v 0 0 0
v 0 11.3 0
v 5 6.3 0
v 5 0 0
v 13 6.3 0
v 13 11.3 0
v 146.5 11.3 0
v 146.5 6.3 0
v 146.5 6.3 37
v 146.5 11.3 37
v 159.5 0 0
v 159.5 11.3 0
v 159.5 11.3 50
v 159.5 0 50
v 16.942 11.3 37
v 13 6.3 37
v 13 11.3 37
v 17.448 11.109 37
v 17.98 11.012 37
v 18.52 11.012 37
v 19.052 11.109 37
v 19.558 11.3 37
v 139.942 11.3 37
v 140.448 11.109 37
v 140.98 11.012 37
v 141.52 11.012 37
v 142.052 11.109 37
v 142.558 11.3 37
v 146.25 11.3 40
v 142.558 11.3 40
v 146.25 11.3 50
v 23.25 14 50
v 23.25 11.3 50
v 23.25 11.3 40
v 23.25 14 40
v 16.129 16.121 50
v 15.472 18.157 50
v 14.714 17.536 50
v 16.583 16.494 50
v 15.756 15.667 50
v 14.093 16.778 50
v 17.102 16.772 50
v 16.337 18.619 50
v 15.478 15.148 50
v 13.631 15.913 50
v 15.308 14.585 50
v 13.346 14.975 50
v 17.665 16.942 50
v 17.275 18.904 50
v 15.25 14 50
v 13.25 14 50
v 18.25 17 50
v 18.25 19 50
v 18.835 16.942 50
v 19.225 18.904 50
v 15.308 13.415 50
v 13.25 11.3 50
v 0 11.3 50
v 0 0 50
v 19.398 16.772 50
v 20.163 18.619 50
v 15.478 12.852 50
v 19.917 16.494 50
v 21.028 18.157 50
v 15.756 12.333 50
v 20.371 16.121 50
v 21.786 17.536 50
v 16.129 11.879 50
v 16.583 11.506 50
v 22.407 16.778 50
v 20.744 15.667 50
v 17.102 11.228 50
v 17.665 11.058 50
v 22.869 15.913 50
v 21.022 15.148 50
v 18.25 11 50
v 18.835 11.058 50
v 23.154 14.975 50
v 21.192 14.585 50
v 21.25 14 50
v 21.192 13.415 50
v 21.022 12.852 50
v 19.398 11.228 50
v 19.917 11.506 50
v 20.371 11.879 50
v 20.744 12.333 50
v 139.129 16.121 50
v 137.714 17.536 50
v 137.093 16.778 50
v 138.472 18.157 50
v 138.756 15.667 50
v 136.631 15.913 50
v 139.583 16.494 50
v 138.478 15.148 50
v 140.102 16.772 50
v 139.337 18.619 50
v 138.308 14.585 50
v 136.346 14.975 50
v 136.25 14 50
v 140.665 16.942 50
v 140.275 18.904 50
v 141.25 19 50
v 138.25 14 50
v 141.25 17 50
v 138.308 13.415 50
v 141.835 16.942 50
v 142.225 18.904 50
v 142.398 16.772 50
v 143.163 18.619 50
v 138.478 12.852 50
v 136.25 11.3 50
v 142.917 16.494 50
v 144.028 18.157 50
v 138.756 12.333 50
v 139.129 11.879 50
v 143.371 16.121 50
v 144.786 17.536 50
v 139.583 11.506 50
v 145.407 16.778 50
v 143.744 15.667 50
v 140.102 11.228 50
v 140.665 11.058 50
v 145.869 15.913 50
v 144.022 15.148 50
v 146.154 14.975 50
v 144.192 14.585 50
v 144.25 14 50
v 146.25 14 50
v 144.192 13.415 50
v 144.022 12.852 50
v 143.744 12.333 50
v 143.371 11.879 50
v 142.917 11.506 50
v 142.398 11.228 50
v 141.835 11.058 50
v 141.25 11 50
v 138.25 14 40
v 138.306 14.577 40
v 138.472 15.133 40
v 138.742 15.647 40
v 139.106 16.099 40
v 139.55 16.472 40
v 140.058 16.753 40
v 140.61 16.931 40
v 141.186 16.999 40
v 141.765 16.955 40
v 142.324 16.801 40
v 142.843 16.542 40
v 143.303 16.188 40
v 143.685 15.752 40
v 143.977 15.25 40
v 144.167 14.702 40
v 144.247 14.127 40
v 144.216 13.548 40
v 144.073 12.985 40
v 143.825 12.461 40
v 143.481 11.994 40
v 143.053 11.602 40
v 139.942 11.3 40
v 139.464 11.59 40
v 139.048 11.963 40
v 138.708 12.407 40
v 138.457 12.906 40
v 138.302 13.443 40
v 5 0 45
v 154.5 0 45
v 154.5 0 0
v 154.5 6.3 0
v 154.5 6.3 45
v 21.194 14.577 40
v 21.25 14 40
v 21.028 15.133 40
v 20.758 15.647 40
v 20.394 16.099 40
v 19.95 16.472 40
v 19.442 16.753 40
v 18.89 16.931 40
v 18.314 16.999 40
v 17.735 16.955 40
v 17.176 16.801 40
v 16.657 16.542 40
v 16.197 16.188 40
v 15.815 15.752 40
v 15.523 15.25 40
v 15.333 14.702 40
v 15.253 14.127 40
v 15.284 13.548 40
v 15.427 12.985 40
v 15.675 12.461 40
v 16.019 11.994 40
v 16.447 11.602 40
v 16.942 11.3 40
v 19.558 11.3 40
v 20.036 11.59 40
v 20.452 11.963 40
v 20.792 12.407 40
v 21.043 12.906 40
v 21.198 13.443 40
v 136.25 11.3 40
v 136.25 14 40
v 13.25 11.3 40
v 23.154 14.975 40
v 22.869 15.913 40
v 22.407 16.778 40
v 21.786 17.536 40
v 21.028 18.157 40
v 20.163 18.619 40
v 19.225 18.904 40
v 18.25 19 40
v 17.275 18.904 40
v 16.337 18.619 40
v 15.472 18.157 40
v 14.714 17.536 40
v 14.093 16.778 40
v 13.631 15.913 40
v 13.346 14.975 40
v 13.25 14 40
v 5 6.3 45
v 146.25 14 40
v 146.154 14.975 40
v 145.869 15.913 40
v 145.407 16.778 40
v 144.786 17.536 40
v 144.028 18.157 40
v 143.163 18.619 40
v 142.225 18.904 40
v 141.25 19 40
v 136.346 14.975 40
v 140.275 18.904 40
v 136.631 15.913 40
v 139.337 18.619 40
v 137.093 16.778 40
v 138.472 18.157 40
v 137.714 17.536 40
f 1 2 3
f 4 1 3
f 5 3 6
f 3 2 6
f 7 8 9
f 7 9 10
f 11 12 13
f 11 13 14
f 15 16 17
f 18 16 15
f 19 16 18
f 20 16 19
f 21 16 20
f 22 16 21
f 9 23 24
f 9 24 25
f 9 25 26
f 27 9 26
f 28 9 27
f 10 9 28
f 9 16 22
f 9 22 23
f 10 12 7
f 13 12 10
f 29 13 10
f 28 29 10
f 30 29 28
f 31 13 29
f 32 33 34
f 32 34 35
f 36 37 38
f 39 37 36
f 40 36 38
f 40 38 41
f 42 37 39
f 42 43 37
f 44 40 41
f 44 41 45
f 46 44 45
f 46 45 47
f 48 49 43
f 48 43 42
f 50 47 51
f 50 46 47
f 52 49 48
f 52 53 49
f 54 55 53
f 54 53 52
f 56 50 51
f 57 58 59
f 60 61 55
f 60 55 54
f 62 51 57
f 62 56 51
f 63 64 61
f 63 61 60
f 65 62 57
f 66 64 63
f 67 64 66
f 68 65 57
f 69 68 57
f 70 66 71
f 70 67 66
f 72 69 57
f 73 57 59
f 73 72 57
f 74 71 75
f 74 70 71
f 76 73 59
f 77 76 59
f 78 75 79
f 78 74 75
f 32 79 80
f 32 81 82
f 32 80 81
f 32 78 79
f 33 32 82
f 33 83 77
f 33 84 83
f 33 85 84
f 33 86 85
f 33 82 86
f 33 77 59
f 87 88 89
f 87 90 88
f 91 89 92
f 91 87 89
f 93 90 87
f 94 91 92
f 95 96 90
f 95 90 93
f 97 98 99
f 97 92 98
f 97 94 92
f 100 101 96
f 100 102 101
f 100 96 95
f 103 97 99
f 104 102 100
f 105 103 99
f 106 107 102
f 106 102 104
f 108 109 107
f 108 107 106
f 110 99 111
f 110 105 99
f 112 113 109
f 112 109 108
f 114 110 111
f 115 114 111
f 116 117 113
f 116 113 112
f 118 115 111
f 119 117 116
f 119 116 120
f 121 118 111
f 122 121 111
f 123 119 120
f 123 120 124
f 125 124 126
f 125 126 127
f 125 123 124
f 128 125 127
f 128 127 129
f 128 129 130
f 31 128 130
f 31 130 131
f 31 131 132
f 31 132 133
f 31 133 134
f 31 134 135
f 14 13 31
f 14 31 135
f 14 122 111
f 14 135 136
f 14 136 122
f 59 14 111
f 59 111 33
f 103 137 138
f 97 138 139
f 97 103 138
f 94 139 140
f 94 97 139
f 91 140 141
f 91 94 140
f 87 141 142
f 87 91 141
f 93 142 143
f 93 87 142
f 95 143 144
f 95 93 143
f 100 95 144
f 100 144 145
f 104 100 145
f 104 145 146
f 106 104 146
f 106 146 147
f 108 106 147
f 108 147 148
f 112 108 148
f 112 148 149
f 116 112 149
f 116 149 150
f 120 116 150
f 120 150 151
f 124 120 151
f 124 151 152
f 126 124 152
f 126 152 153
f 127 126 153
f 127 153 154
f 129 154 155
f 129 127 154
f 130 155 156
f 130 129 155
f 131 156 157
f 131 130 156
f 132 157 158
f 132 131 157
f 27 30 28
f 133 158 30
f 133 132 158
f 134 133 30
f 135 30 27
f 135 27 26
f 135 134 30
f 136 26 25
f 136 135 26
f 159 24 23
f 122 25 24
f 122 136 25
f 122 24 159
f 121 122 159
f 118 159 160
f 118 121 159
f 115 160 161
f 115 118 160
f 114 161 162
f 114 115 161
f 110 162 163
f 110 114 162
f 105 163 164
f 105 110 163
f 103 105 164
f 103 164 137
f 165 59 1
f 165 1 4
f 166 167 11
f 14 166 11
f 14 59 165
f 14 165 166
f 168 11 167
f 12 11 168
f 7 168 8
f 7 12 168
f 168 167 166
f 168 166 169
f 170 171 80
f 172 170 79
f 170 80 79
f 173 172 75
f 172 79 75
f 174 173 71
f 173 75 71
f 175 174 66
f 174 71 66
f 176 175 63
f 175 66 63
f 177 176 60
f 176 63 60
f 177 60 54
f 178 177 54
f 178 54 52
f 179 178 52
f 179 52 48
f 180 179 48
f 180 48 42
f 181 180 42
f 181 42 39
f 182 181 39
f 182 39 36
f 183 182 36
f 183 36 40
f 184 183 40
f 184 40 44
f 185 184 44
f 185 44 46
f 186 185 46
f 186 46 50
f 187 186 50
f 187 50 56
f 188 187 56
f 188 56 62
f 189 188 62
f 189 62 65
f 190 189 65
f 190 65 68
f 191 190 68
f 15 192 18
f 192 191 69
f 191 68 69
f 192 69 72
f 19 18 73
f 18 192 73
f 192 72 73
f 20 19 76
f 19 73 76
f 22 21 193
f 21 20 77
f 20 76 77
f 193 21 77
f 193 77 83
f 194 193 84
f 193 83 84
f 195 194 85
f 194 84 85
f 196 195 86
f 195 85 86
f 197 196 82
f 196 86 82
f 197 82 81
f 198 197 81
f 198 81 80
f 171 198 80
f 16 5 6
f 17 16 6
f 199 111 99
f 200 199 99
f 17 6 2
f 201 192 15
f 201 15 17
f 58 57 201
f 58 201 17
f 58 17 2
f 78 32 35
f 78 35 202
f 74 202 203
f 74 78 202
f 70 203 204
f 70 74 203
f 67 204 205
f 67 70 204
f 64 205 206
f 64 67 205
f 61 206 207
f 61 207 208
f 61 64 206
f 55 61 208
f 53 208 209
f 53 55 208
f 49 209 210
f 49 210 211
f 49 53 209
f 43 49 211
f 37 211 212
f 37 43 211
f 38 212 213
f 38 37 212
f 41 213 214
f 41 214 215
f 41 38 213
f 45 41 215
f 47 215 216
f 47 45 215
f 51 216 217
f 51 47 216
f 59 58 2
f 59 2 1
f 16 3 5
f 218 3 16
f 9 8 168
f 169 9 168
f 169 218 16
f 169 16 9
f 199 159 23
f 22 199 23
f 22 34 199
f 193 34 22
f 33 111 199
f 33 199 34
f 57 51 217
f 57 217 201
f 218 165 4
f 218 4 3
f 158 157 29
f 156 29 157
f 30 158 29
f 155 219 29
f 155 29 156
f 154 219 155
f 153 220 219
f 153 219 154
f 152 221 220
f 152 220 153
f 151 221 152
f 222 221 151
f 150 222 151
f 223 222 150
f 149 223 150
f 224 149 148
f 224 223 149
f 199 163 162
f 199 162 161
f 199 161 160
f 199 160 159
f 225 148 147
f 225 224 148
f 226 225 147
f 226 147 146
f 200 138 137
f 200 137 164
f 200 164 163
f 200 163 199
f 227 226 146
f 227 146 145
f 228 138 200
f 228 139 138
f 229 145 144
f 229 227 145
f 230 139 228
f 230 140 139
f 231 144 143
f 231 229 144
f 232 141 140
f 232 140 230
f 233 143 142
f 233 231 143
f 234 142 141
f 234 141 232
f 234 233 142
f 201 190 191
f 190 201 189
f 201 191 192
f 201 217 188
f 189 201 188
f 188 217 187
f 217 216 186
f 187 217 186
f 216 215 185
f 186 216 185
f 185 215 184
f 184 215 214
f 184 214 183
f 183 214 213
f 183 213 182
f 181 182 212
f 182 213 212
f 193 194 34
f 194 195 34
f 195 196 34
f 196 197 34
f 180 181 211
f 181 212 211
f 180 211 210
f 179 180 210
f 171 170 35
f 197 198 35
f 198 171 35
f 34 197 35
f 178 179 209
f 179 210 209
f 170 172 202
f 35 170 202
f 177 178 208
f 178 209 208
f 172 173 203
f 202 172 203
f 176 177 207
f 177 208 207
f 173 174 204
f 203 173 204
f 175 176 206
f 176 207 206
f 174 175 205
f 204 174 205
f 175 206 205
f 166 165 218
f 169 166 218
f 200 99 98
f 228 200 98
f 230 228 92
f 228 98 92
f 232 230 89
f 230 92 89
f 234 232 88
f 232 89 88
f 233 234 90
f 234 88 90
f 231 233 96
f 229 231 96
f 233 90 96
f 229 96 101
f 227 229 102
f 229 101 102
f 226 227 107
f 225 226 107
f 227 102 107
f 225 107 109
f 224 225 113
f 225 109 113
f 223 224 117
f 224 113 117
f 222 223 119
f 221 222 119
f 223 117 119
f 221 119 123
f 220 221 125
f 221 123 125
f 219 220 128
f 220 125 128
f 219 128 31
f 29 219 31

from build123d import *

# Parameters (mm, degrees)
SALIENTE_EXTRUIR1_DEPTH = 10
CROQUIS5_R              = 3
CORTAR_EXTRUIR1_DEPTH   = 169.229753611


with BuildPart() as part:
    # Barrer1: sweep along a path in Croquis3
    with BuildLine(Plane(origin=(0, 0, 0), x_dir=(1, 0, 0), z_dir=(0, 1, 0))) as barrer1_path:
        Line((0, 0), (0, -50))
        Line((0, -50), (159.5, -50))
        Line((159.5, -50), (159.5, 0))
    # Croquis1 → Barrer1 (sweep)
    with BuildSketch(Plane.XY):
        Polygon((0, 0), (0, 11.3), (13, 11.3), (13, 6.3), (5, 6.3), (5, 0), align=None)
    sweep(path=barrer1_path.line, transition=Transition.RIGHT)

    # Croquis4 → Saliente-Extruir1 (add)
    with BuildSketch(Plane.XY.offset(50)):
        with BuildLine():
            Line((13.25, 11.3), (23.25, 11.3))
            Line((23.25, 11.3), (23.25, 14))
            ThreePointArc((23.25, 14), (18.25, 19), (13.25, 14))
            Line((13.25, 14), (13.25, 11.3))
        make_face()
    saliente_extruir1 = extrude(amount=-SALIENTE_EXTRUIR1_DEPTH)

    # Croquis5 → Cortar-Extruir1 (cut, through all)
    with BuildSketch(Plane.XY.offset(50)):
        with Locations((18.25, 14)):
            Circle(CROQUIS5_R)
    cortar_extruir1 = extrude(amount=-CORTAR_EXTRUIR1_DEPTH, mode=Mode.SUBTRACT)

    # Simetría1: Saliente-Extruir1, Cortar-Extruir1 across plane
    add(saliente_extruir1.mirror(Plane(origin=(79.75, 0, 0), x_dir=(0, 0, 1), z_dir=(1, 0, 0))))
    add(cortar_extruir1.mirror(Plane(origin=(79.75, 0, 0), x_dir=(0, 0, 1), z_dir=(1, 0, 0))), mode=Mode.SUBTRACT)


solid = part.part
